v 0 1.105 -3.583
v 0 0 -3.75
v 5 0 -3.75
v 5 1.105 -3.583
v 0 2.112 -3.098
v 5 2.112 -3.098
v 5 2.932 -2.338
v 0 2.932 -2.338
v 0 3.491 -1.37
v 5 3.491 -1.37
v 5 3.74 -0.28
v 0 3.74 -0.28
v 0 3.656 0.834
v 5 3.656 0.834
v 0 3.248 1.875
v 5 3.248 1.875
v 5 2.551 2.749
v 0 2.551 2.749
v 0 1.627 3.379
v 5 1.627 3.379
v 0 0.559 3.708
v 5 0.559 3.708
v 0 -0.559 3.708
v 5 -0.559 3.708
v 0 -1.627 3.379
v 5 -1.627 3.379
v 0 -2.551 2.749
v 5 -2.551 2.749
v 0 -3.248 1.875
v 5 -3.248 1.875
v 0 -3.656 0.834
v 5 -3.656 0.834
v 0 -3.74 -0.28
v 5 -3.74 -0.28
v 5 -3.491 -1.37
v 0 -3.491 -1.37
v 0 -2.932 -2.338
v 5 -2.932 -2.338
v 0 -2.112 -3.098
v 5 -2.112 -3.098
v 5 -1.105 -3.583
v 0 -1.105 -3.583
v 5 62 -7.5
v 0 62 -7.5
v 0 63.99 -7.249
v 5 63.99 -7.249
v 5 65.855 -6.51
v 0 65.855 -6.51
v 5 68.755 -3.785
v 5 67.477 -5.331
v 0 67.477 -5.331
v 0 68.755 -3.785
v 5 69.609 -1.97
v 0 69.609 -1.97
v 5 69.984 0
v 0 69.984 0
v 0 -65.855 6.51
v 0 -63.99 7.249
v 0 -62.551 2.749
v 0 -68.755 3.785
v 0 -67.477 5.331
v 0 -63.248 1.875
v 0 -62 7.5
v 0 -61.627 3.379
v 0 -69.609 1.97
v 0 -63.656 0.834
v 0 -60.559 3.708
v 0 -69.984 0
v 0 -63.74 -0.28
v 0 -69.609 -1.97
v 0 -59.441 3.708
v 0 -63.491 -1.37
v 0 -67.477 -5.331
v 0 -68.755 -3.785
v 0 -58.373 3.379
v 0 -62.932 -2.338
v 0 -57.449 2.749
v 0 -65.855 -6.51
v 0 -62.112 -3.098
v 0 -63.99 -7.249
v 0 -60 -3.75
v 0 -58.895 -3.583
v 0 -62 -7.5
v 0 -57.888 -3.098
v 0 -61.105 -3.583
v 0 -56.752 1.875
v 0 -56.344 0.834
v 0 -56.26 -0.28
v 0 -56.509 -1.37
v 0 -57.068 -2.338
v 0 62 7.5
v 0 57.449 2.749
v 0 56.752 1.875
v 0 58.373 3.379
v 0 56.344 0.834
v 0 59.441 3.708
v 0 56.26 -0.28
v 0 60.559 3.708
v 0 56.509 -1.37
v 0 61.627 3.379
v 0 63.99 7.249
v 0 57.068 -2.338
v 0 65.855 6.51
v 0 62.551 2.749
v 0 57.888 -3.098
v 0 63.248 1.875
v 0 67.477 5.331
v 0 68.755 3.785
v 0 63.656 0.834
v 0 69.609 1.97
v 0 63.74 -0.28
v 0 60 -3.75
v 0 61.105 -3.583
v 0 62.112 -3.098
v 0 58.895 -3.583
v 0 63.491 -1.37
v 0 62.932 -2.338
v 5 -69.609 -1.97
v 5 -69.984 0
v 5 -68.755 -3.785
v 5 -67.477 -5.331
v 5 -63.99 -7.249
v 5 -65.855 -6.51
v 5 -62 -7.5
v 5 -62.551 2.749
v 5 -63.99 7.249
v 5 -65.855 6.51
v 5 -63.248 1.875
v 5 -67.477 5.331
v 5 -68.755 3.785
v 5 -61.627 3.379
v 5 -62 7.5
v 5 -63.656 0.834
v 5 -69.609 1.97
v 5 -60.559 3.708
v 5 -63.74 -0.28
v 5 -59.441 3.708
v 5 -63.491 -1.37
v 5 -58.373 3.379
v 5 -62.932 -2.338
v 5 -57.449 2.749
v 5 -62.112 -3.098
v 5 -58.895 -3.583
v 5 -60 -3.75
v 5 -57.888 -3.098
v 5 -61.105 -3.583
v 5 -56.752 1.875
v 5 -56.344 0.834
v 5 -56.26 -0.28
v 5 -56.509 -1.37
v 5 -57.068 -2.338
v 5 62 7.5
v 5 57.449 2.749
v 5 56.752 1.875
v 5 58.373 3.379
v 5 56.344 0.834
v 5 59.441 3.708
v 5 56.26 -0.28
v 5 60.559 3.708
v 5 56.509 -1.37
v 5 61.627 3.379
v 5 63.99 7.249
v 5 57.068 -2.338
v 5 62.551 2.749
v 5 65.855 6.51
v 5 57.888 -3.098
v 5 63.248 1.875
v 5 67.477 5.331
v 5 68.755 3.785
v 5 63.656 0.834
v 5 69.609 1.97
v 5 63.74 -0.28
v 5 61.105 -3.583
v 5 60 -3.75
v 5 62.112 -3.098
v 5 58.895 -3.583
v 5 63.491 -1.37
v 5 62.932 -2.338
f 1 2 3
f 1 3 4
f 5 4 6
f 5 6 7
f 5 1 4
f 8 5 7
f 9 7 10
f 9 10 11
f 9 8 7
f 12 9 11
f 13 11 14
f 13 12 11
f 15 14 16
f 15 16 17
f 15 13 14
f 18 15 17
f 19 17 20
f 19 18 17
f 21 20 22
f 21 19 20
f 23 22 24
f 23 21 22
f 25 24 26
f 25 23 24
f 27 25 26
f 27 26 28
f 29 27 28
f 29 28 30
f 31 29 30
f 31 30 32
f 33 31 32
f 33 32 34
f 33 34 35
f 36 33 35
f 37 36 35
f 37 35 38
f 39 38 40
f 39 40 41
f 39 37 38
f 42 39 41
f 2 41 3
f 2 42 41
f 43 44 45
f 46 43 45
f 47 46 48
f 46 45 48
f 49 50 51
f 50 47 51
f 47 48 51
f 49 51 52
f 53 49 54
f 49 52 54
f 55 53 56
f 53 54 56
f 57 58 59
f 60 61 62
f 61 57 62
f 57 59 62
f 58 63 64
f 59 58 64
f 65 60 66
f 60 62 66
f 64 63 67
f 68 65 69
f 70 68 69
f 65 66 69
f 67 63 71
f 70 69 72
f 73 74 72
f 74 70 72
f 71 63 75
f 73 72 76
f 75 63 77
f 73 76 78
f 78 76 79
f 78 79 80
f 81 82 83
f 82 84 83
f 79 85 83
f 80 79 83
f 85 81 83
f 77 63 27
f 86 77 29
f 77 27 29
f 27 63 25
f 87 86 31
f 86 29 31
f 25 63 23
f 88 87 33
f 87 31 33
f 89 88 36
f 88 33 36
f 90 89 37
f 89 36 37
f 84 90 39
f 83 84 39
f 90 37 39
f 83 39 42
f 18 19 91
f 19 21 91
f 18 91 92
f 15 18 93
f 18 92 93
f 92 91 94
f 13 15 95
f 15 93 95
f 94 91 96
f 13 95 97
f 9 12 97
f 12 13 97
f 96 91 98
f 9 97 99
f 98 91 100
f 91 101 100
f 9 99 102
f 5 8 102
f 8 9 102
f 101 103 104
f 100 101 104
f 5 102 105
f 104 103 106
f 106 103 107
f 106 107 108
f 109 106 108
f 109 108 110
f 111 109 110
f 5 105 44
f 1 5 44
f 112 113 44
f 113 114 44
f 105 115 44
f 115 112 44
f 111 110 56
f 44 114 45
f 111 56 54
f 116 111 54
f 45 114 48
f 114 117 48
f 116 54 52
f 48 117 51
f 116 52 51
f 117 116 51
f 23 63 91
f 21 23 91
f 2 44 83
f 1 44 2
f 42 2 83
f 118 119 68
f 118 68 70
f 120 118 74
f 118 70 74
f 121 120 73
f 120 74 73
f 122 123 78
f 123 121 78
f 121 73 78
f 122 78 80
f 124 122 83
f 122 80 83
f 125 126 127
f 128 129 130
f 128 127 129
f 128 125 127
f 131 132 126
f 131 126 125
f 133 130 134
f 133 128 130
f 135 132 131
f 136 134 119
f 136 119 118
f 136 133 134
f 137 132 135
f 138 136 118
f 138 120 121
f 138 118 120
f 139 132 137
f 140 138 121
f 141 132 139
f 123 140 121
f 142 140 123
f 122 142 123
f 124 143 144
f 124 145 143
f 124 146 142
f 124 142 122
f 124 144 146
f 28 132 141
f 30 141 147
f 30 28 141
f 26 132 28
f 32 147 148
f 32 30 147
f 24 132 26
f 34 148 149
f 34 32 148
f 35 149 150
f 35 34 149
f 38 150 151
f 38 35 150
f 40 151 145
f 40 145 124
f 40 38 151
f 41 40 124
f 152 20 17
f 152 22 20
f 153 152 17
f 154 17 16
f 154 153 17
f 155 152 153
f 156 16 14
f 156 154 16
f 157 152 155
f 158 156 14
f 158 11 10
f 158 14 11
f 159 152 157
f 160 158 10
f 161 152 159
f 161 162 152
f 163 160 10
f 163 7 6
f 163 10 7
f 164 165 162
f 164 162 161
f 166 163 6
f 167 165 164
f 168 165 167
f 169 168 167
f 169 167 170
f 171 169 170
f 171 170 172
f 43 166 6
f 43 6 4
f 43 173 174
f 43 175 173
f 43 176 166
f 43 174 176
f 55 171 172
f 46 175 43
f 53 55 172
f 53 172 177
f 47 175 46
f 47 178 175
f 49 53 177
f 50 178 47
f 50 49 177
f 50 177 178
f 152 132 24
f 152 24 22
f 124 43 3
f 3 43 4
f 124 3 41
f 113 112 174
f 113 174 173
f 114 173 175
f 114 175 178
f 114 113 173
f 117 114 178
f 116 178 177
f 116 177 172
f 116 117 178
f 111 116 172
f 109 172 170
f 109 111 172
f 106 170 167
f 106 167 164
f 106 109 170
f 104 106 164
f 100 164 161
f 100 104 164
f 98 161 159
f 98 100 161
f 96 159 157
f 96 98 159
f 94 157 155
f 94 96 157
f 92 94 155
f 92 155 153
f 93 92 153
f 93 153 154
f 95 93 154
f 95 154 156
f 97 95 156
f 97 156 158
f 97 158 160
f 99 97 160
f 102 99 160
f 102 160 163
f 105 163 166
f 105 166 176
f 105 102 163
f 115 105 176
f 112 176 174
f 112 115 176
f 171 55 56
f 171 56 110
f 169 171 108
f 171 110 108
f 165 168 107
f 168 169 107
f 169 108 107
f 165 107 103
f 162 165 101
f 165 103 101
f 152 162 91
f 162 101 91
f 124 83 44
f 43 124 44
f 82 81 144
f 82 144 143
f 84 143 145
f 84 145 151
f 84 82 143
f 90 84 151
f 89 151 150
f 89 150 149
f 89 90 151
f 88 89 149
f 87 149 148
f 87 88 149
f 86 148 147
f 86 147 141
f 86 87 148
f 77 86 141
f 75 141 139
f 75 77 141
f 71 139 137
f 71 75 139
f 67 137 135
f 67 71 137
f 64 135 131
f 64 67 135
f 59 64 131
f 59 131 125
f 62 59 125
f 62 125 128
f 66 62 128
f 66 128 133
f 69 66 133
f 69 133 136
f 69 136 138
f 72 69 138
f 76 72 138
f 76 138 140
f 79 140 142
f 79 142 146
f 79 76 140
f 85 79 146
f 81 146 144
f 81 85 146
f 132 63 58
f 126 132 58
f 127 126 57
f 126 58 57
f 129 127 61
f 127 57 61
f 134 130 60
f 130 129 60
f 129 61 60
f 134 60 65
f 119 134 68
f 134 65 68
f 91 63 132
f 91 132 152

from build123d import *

# Parameters (mm, degrees)
SKETCH1_W           = 15
SKETCH1_H           = 140
SKETCH1_R           = 3.75
BOSS_EXTRUDE1_DEPTH = 5
FILLET1_R           = 8


with BuildPart() as part:
    # Sketch1 → Boss-Extrude1 (new body)
    with BuildSketch(Plane(origin=(0, 0, 0), x_dir=(0, 0, -1), z_dir=(1, 0, 0))):
        Rectangle(SKETCH1_W, SKETCH1_H)
        Circle(SKETCH1_R, mode=Mode.SUBTRACT)
        with Locations((0, 60)):
            Circle(SKETCH1_R, mode=Mode.SUBTRACT)
        with Locations((0, -60)):
            Circle(SKETCH1_R, mode=Mode.SUBTRACT)
    extrude(amount=BOSS_EXTRUDE1_DEPTH)

    # Fillet1
    # the kernel refuses this fillet: 8 mm, written as the material it takes off along each edge
    with BuildSketch(Plane(origin=(-20, -70, 7.5), x_dir=(0, 0, -1), z_dir=(1, 0, 0))) as fillet1_piece_1:
        with BuildLine():
            CenterArc((FILLET1_R, FILLET1_R), FILLET1_R, 180, 90)
            Line((0, FILLET1_R), (0, 0))
            Line((0, 0), (FILLET1_R, 0))
        make_face()
    extrude(amount=45, mode=Mode.SUBTRACT)
    with BuildSketch(Plane(origin=(-20, -70, -7.5), x_dir=(0, 0, 1), z_dir=(1, 0, 0)), Plane(origin=(-20, 70, -7.5), x_dir=(0, -1, 0), z_dir=(1, 0, 0)), Plane(origin=(-20, 70, 7.5), x_dir=(0, 0, -1), z_dir=(1, 0, 0))) as fillet1_piece_2:
        with BuildLine():
            CenterArc((FILLET1_R, -FILLET1_R), FILLET1_R, 90, 90)
            Line((0, -FILLET1_R), (0, 0))
            Line((0, 0), (FILLET1_R, 0))
        make_face()
    extrude(amount=45, mode=Mode.SUBTRACT)


solid = part.part
